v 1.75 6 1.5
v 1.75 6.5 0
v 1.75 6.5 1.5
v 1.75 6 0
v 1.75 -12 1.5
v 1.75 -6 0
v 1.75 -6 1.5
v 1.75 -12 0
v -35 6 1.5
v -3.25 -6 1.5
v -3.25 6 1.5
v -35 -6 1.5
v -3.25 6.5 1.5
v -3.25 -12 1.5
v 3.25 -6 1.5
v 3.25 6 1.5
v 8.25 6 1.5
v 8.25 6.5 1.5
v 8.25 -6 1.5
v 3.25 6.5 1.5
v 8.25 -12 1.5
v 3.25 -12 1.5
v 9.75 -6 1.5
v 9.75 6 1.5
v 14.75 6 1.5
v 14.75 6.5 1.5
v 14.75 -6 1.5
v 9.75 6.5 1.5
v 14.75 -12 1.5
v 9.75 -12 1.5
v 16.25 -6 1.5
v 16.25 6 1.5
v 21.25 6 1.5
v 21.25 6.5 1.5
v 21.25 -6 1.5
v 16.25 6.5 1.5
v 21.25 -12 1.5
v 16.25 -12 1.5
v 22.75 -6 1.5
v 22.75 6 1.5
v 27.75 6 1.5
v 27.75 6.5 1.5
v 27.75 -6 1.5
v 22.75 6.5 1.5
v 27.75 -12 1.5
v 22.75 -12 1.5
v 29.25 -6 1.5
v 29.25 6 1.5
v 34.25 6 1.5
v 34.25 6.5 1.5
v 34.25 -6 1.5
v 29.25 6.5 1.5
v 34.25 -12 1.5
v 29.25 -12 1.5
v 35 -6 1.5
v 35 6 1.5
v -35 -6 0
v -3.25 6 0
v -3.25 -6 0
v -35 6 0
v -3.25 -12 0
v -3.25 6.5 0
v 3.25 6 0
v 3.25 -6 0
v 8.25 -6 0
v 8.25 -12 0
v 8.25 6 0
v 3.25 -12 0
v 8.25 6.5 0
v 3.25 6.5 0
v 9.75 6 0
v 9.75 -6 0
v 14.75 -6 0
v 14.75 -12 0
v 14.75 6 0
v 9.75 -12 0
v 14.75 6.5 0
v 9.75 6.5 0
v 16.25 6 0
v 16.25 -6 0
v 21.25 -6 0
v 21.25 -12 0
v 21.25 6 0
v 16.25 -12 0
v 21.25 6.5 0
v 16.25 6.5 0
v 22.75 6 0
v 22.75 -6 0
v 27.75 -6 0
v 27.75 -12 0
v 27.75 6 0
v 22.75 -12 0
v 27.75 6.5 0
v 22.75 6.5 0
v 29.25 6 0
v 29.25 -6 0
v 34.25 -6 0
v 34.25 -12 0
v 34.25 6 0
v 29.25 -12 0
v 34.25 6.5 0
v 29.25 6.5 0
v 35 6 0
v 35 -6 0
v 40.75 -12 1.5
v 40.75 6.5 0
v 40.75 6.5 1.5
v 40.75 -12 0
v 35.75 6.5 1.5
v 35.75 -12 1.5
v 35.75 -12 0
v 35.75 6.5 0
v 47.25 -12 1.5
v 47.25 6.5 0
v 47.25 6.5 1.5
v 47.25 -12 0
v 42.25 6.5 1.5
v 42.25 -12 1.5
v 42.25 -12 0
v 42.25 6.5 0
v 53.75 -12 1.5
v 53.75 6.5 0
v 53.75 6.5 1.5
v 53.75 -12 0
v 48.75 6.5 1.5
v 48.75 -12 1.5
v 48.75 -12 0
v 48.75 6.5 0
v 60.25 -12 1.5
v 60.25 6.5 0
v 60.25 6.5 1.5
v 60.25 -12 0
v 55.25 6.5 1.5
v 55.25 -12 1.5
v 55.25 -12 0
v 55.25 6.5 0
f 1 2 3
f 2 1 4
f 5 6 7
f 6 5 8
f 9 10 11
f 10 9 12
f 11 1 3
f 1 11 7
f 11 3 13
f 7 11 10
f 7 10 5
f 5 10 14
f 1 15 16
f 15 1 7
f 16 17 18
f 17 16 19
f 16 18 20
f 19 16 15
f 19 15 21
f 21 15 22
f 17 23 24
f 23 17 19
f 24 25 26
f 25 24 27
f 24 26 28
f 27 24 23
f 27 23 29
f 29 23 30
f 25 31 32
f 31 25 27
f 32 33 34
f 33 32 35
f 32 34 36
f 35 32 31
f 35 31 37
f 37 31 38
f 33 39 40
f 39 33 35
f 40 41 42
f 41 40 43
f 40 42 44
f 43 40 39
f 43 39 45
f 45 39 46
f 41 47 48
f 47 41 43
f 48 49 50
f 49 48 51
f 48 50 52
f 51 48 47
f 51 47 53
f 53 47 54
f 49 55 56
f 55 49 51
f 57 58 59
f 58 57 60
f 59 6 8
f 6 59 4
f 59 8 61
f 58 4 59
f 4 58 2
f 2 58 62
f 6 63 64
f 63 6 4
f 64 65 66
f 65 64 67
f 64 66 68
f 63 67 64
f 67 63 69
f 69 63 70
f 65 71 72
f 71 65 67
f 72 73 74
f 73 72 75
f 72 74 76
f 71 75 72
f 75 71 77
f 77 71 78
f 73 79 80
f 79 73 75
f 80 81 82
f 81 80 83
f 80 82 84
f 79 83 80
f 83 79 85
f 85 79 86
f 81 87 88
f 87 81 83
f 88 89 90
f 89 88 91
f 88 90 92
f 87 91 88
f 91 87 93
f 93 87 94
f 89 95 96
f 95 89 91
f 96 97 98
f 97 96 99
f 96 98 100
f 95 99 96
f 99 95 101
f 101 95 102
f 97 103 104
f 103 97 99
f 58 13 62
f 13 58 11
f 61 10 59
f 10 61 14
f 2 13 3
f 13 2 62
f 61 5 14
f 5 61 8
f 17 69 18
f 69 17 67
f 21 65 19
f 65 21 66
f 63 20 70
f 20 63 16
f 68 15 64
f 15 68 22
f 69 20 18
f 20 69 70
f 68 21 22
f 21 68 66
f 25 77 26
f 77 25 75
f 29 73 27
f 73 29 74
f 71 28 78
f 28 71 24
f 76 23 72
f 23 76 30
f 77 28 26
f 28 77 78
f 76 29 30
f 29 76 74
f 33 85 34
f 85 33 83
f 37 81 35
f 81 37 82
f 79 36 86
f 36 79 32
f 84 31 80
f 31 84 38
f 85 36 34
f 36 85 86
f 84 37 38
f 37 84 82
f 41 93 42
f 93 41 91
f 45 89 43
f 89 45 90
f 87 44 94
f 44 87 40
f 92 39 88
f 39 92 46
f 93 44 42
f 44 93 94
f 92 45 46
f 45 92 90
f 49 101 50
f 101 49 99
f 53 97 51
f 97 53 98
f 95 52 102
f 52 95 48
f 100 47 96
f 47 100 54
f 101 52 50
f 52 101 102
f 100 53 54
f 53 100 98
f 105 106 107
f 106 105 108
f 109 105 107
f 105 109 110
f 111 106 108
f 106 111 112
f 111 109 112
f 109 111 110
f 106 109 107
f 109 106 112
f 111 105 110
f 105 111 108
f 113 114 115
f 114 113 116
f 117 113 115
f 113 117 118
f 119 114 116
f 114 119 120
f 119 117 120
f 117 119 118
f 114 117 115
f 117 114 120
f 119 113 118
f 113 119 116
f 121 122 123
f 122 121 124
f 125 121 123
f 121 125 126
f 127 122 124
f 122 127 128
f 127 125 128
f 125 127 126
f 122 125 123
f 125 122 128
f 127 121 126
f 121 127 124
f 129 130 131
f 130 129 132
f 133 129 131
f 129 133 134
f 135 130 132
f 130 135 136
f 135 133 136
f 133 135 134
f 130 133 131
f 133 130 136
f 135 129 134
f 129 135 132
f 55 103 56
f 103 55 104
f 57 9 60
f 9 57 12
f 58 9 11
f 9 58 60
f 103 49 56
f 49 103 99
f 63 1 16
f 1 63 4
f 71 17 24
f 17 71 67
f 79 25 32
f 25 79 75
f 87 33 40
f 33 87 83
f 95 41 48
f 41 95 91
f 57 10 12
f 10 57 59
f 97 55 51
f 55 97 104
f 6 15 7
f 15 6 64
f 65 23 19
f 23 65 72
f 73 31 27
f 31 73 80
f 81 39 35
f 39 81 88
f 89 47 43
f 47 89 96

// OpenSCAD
// 10-well comb for agarose gel casting
// Print orientation: flat on bed, teeth pointing up (+Z)

// ---------- Parameters ----------
plate_len    = 70;    // spine length along X (mm)
plate_wid    = 12;    // spine width along Y (mm)
plate_thk    = 1.5;   // plate thickness along Z (mm)

tooth_count  = 10;    // number of wells/teeth
tooth_w      = 5.0;   // tooth width along X (mm)
tooth_len    = 12;    // tooth length along Y (mm)
tooth_pitch  = 1.5;   // gap between neighbouring teeth (mm)

eps          = 0.5;   // cutter overshoot past faces (mm)
$fn          = 64;    // curve resolution

// ---------- Derived ----------
total_tooth_w = tooth_count * tooth_w + (tooth_count - 1) * tooth_pitch;
x_start       = -(plate_len / 2 - total_tooth_w / 2);  // first tooth centre X

// ---------- Model ----------
union() {
    // Spine (back bar)
    translate([-plate_len / 2, -plate_wid / 2, 0])
        cube([plate_len, plate_wid, plate_thk]);

    // Teeth, hanging from the -Y edge of the spine
    for (i = [0 : tooth_count - 1]) {
        translate([x_start + i * (tooth_w + tooth_pitch),
                   -tooth_len,
                   0])
            cube([tooth_w, tooth_len + plate_wid / 2 + eps, plate_thk]);
    }
}
